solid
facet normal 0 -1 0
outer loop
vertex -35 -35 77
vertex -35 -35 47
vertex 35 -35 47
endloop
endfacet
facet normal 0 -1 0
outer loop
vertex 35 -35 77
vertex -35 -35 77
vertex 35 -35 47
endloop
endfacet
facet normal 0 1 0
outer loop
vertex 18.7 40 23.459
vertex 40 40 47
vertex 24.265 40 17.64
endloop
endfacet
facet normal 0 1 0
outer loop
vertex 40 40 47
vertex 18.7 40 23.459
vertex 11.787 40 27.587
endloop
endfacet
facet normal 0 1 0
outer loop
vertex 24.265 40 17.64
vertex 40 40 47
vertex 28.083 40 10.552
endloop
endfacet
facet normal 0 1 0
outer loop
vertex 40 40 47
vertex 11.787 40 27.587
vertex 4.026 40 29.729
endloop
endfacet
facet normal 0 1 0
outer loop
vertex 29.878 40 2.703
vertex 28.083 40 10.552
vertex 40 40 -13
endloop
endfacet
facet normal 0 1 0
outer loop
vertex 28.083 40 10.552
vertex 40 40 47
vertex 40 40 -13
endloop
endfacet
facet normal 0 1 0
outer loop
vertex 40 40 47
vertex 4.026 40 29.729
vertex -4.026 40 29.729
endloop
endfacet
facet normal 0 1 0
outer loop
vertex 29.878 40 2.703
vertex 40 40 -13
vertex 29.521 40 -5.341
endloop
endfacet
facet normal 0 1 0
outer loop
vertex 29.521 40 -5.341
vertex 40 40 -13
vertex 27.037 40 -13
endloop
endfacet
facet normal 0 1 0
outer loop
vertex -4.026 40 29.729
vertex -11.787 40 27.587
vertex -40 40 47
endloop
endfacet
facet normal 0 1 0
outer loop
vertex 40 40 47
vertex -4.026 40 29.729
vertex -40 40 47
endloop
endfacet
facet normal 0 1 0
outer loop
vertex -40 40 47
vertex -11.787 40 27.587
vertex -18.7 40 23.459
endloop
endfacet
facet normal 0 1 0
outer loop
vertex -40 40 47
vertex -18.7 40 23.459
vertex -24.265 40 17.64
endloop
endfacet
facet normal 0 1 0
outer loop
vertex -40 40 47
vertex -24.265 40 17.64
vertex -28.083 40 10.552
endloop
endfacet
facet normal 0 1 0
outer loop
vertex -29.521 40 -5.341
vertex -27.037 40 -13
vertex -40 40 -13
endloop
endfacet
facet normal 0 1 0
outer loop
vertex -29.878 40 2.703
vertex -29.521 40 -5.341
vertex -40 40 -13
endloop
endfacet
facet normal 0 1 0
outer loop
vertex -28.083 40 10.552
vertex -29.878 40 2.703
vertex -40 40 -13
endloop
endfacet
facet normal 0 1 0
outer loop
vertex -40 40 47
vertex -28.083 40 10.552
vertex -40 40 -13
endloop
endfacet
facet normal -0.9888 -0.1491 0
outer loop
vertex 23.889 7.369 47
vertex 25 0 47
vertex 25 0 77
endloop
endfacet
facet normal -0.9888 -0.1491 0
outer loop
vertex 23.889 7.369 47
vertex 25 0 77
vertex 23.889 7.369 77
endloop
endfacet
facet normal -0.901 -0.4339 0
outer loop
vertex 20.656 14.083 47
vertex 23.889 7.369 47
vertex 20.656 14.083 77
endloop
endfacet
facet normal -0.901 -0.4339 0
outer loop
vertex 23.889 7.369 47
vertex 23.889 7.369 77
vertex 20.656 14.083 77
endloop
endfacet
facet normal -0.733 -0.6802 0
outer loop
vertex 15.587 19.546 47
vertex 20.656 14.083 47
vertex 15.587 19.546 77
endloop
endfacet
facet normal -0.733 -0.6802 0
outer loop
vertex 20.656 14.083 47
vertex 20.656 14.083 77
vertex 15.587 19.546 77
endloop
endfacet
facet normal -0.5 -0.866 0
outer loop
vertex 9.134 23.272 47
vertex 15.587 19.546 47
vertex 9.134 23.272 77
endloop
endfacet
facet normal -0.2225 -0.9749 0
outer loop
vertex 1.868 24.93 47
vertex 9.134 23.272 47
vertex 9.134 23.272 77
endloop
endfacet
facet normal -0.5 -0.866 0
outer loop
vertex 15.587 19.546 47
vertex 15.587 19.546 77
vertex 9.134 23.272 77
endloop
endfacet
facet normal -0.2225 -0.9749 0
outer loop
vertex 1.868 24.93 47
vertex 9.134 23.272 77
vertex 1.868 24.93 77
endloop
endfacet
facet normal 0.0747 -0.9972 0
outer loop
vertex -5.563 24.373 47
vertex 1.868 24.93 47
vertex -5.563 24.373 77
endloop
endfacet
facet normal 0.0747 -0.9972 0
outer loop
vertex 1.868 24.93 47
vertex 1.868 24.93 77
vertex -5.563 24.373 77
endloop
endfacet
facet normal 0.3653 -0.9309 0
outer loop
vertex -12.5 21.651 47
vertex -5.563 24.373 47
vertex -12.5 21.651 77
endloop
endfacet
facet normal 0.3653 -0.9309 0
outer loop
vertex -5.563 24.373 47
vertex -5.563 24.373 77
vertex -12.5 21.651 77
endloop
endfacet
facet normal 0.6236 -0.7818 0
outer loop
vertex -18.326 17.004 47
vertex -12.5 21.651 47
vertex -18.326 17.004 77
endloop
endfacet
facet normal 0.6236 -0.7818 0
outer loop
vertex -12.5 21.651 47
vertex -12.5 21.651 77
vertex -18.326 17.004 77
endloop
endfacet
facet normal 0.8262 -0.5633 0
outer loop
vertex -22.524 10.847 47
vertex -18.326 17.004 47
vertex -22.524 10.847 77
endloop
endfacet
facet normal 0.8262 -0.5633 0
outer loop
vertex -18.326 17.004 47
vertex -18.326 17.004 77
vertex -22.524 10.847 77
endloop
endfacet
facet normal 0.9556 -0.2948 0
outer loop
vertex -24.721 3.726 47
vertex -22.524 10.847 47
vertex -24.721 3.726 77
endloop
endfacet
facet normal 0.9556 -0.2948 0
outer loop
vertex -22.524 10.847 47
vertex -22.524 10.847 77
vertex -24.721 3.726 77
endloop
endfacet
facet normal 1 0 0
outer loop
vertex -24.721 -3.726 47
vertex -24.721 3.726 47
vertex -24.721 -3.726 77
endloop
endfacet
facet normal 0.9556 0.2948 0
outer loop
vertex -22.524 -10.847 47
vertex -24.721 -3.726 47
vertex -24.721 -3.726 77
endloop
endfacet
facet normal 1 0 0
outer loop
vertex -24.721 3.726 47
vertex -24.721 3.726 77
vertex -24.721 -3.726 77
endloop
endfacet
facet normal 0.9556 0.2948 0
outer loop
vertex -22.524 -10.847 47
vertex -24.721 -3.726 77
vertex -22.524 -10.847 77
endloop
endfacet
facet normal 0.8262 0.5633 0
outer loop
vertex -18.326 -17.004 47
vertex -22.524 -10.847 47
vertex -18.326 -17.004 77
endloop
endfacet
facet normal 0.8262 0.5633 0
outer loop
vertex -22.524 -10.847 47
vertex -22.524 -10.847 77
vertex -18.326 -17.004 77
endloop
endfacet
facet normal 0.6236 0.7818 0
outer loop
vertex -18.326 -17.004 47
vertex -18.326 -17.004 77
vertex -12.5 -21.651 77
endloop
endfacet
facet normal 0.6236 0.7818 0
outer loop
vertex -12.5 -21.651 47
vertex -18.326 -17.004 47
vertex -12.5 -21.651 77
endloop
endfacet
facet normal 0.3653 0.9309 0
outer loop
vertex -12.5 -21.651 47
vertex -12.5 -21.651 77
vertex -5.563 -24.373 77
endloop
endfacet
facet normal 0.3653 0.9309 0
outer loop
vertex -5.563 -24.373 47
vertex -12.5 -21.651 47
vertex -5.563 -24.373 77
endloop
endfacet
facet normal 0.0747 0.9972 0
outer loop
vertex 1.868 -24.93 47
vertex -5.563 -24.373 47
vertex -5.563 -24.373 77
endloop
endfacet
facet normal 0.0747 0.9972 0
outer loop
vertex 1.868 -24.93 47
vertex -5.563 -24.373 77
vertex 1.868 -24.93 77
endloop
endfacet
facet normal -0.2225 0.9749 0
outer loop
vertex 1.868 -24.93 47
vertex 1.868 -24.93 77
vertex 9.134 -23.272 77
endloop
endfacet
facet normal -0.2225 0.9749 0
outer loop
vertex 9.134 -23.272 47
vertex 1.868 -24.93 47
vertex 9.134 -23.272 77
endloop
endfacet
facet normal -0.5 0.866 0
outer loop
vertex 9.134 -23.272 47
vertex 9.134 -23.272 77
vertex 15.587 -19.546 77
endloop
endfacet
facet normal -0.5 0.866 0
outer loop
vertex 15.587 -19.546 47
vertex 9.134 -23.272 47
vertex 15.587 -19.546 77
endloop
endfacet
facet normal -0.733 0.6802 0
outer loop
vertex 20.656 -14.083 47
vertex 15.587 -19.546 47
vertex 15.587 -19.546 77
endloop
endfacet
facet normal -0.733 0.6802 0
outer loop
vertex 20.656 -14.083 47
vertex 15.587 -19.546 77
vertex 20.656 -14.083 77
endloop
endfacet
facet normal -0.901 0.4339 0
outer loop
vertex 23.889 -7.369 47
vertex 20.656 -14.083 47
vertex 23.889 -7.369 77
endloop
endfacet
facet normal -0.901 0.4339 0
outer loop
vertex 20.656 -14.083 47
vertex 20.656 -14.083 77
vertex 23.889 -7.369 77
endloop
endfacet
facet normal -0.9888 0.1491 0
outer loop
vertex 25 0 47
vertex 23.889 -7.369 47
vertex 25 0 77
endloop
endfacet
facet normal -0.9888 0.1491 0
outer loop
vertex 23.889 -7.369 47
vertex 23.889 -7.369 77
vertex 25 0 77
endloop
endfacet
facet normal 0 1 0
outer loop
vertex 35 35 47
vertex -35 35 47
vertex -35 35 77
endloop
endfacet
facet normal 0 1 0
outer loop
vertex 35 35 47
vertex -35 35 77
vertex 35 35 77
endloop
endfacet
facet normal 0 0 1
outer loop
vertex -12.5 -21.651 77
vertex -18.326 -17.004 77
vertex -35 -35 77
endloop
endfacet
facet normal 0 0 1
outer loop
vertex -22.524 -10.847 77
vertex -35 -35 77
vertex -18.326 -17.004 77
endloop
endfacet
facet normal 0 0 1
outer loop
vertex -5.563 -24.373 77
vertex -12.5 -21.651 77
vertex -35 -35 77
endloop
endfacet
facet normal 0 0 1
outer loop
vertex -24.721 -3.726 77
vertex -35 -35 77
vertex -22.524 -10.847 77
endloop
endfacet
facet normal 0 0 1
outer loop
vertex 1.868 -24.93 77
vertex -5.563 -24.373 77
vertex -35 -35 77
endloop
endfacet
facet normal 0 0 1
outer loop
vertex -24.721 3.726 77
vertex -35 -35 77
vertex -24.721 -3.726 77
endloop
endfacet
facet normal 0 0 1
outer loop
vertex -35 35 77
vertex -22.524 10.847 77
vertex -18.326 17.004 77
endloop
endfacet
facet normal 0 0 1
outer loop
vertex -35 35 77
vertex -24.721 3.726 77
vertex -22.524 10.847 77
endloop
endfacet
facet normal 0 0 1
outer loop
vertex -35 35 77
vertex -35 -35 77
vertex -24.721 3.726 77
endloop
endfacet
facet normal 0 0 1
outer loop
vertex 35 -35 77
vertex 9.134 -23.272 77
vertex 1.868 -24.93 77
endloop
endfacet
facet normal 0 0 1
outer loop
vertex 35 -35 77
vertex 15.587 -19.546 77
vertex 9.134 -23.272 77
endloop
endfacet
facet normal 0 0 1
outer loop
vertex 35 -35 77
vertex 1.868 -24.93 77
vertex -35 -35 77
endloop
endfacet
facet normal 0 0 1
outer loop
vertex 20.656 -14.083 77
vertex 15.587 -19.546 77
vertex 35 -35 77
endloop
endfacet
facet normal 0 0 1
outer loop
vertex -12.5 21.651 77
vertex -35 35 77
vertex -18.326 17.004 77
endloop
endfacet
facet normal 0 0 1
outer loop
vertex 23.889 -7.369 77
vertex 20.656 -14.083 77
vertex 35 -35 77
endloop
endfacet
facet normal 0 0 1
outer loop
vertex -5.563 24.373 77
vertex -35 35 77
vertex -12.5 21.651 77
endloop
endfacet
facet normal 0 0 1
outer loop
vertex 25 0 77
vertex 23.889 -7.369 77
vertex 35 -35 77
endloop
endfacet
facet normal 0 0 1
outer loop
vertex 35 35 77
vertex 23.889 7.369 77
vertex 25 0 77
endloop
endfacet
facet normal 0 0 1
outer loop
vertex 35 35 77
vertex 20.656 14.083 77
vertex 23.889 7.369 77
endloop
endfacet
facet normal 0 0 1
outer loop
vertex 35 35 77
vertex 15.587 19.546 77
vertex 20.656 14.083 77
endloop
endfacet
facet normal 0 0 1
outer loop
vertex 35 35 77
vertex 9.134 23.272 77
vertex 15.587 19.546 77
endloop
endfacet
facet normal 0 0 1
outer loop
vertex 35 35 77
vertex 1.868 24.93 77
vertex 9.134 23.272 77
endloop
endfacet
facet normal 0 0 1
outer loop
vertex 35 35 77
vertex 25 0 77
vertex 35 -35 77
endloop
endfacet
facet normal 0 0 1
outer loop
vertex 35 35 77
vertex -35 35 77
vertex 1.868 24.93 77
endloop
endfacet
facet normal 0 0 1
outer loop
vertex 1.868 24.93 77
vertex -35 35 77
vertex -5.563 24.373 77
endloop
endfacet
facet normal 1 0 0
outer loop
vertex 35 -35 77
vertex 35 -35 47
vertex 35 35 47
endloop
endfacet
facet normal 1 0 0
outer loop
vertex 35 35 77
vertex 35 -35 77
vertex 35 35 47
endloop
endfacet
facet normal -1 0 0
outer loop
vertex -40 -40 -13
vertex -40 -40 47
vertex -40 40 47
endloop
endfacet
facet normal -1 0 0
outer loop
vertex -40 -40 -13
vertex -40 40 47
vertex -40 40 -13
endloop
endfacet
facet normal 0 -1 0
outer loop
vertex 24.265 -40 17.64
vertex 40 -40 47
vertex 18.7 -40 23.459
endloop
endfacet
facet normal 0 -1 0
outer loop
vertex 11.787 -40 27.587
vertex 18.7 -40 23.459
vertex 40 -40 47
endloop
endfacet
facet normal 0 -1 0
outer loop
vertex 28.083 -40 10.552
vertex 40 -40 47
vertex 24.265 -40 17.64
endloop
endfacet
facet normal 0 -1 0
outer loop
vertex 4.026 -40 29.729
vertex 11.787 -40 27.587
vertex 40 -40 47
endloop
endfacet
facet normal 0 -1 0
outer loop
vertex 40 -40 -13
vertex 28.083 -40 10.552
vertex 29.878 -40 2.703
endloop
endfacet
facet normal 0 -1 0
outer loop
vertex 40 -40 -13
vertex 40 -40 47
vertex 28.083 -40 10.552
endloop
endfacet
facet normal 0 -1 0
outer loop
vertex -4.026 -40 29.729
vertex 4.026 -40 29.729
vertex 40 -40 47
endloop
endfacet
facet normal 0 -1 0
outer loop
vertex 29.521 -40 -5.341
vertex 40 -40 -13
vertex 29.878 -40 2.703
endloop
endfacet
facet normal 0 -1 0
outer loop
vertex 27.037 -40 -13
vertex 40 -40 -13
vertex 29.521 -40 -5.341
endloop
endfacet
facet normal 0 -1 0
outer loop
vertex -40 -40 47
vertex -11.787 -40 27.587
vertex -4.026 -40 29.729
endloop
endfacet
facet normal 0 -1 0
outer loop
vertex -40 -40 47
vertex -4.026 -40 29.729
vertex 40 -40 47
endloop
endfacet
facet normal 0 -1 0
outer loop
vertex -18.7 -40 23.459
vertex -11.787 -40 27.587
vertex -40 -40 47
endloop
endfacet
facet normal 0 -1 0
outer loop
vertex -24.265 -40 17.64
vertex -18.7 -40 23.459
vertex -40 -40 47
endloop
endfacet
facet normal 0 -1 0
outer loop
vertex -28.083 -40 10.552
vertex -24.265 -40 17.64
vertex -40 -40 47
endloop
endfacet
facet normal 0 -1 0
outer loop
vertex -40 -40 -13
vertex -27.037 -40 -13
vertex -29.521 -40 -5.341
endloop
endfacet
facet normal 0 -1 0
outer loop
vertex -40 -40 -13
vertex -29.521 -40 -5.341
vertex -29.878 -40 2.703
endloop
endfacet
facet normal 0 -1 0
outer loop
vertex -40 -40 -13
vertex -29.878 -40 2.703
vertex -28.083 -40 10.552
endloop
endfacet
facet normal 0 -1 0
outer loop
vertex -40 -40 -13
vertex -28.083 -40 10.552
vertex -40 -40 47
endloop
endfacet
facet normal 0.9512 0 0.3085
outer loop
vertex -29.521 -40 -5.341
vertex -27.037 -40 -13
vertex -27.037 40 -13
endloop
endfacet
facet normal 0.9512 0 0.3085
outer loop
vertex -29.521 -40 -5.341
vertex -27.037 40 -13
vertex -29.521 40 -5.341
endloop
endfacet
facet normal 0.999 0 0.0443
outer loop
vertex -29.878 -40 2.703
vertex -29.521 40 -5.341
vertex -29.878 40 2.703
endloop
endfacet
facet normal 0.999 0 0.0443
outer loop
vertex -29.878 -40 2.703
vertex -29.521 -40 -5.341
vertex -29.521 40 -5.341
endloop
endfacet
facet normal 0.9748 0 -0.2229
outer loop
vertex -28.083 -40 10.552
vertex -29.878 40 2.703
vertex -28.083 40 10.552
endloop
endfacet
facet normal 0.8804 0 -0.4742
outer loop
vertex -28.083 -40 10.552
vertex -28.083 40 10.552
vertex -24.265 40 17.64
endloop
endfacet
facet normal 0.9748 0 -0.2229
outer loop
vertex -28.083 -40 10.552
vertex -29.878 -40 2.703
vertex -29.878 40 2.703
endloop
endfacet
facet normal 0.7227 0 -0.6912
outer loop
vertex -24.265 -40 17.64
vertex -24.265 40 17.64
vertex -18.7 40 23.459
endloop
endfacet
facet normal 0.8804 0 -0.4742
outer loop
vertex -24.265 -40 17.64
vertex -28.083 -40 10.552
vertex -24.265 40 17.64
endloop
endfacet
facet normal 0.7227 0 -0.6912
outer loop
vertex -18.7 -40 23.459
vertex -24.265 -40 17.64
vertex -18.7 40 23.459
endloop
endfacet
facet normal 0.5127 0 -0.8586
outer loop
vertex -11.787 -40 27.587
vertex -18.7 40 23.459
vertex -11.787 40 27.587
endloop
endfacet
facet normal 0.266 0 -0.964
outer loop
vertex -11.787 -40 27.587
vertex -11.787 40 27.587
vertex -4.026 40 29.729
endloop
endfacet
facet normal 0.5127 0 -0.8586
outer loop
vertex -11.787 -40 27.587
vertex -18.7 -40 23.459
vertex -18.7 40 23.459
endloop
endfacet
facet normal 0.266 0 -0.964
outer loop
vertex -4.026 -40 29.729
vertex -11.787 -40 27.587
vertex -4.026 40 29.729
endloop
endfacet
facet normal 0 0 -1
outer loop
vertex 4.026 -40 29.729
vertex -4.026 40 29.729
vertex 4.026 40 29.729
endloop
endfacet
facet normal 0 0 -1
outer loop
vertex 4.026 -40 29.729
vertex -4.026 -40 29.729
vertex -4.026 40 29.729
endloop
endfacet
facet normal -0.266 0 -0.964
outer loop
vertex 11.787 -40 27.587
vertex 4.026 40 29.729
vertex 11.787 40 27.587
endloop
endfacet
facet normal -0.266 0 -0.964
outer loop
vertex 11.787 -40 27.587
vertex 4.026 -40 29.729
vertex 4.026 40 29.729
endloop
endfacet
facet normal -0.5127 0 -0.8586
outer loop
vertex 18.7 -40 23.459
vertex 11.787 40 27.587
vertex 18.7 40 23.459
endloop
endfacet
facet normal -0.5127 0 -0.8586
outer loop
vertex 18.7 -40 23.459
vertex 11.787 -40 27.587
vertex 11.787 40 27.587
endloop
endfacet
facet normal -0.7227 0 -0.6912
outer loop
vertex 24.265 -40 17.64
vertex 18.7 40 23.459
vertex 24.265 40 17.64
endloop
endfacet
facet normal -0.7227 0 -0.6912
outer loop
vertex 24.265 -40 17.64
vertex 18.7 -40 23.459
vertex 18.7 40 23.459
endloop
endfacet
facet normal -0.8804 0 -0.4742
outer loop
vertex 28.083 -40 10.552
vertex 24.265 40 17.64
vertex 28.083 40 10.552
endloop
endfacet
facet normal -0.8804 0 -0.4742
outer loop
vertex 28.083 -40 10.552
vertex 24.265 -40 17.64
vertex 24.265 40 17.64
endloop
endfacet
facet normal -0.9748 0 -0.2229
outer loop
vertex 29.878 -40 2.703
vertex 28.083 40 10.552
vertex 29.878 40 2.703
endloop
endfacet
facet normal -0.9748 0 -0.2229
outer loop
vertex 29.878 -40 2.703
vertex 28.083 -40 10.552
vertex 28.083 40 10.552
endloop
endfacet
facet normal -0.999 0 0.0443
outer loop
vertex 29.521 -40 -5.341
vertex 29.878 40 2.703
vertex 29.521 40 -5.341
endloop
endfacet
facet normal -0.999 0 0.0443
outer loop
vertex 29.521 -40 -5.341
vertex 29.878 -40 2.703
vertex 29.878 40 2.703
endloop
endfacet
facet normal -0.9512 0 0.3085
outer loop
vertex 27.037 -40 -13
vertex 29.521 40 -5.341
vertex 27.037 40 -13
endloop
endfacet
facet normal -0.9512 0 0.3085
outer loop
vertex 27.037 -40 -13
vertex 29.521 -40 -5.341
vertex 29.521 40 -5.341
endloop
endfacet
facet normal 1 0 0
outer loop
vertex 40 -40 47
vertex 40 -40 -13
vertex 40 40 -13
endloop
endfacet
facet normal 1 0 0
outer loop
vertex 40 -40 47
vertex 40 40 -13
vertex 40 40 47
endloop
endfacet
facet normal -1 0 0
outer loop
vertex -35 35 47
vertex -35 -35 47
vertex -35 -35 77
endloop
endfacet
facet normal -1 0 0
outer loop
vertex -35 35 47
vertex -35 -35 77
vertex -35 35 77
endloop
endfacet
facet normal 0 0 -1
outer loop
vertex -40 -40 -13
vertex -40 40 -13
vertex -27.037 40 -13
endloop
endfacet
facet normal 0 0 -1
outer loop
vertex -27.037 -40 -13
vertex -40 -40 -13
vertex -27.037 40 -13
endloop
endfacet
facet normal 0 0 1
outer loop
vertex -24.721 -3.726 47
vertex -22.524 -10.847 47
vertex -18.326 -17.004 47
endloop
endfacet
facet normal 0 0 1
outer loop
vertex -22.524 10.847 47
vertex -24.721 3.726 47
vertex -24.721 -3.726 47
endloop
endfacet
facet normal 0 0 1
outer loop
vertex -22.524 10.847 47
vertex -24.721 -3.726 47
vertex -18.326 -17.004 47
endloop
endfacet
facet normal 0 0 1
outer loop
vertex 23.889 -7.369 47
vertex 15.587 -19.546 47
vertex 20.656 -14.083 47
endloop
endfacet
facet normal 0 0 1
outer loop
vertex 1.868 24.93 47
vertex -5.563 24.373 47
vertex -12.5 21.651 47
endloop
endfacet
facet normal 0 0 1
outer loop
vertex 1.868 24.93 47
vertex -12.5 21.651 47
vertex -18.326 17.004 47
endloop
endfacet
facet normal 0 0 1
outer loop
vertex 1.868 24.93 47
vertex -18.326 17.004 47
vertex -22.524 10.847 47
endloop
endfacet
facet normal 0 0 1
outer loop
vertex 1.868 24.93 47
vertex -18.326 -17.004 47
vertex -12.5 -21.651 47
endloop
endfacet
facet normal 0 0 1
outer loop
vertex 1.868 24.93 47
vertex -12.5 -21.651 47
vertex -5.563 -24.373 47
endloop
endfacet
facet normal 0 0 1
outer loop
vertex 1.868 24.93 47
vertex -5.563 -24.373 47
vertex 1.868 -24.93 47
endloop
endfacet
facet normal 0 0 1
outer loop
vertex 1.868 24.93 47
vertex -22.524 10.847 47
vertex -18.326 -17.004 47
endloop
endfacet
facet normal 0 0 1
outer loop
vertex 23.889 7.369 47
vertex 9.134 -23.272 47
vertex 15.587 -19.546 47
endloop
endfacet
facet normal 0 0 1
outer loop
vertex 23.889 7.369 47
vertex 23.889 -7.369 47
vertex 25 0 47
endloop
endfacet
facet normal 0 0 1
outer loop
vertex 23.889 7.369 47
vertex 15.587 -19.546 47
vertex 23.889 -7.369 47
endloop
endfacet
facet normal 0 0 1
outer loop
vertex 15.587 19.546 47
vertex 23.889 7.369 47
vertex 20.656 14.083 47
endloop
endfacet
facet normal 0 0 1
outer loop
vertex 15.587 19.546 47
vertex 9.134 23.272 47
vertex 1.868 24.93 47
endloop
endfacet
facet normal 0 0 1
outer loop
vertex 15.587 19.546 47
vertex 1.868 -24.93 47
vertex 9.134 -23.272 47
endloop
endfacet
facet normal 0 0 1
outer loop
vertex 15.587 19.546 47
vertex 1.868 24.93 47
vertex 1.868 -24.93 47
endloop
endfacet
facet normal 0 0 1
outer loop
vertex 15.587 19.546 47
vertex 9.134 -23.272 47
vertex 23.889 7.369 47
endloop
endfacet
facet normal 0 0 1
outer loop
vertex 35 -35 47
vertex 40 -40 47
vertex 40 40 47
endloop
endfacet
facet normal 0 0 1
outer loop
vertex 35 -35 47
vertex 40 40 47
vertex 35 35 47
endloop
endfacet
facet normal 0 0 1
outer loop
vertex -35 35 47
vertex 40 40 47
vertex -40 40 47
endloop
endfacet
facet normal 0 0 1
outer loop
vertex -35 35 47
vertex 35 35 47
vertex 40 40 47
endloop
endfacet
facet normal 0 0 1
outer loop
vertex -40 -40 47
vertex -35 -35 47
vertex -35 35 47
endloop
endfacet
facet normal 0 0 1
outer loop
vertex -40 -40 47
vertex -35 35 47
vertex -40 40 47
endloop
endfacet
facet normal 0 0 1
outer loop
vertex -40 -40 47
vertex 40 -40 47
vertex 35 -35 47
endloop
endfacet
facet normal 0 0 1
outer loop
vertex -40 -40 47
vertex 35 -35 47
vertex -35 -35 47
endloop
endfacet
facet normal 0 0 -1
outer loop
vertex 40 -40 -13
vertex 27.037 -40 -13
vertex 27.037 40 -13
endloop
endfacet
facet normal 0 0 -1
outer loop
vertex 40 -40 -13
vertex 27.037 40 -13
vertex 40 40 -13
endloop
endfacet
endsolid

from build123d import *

# Parameters (mm, degrees)
SALIENTE_EXTRUIR1_DEPTH      = 40
SALIENTE_EXTRUIR1_DEPTH_BACK = 40
CROQUIS2_W                   = 70
CROQUIS2_H                   = 70
SALIENTE_EXTRUIR2_DEPTH      = 30
CROQUIS3_R                   = 25
CORTAR_EXTRUIR1_DEPTH        = 30


with BuildPart() as part:
    # Croquis1 → Saliente-Extruir1 (new, two sides: drawn at the far end of the back side and taken through both)
    with BuildSketch(Plane(origin=(0, 0, 0), x_dir=(1, 0, 0), z_dir=(0, 1, 0)).offset(-SALIENTE_EXTRUIR1_DEPTH_BACK)):
        with BuildLine():
            Line((-40, 13), (-27.037011669, 13))
            ThreePointArc((-27.037011669, 13), (0, -30), (27.037011669, 13))
            Line((27.037011669, 13), (40, 13))
            Line((40, 13), (40, -47))
            Line((40, -47), (-40, -47))
            Line((-40, -47), (-40, 13))
        make_face()
    extrude(amount=SALIENTE_EXTRUIR1_DEPTH + SALIENTE_EXTRUIR1_DEPTH_BACK)

    # Croquis2 → Saliente-Extruir2 (add)
    with BuildSketch(Plane.XY.offset(47)):
        Rectangle(CROQUIS2_W, CROQUIS2_H)
    extrude(amount=SALIENTE_EXTRUIR2_DEPTH)

    # Croquis3 → Cortar-Extruir1 (cut)
    with BuildSketch(Plane.XY.offset(77)):
        Circle(CROQUIS3_R)
    extrude(amount=-CORTAR_EXTRUIR1_DEPTH, mode=Mode.SUBTRACT)


solid = part.part
